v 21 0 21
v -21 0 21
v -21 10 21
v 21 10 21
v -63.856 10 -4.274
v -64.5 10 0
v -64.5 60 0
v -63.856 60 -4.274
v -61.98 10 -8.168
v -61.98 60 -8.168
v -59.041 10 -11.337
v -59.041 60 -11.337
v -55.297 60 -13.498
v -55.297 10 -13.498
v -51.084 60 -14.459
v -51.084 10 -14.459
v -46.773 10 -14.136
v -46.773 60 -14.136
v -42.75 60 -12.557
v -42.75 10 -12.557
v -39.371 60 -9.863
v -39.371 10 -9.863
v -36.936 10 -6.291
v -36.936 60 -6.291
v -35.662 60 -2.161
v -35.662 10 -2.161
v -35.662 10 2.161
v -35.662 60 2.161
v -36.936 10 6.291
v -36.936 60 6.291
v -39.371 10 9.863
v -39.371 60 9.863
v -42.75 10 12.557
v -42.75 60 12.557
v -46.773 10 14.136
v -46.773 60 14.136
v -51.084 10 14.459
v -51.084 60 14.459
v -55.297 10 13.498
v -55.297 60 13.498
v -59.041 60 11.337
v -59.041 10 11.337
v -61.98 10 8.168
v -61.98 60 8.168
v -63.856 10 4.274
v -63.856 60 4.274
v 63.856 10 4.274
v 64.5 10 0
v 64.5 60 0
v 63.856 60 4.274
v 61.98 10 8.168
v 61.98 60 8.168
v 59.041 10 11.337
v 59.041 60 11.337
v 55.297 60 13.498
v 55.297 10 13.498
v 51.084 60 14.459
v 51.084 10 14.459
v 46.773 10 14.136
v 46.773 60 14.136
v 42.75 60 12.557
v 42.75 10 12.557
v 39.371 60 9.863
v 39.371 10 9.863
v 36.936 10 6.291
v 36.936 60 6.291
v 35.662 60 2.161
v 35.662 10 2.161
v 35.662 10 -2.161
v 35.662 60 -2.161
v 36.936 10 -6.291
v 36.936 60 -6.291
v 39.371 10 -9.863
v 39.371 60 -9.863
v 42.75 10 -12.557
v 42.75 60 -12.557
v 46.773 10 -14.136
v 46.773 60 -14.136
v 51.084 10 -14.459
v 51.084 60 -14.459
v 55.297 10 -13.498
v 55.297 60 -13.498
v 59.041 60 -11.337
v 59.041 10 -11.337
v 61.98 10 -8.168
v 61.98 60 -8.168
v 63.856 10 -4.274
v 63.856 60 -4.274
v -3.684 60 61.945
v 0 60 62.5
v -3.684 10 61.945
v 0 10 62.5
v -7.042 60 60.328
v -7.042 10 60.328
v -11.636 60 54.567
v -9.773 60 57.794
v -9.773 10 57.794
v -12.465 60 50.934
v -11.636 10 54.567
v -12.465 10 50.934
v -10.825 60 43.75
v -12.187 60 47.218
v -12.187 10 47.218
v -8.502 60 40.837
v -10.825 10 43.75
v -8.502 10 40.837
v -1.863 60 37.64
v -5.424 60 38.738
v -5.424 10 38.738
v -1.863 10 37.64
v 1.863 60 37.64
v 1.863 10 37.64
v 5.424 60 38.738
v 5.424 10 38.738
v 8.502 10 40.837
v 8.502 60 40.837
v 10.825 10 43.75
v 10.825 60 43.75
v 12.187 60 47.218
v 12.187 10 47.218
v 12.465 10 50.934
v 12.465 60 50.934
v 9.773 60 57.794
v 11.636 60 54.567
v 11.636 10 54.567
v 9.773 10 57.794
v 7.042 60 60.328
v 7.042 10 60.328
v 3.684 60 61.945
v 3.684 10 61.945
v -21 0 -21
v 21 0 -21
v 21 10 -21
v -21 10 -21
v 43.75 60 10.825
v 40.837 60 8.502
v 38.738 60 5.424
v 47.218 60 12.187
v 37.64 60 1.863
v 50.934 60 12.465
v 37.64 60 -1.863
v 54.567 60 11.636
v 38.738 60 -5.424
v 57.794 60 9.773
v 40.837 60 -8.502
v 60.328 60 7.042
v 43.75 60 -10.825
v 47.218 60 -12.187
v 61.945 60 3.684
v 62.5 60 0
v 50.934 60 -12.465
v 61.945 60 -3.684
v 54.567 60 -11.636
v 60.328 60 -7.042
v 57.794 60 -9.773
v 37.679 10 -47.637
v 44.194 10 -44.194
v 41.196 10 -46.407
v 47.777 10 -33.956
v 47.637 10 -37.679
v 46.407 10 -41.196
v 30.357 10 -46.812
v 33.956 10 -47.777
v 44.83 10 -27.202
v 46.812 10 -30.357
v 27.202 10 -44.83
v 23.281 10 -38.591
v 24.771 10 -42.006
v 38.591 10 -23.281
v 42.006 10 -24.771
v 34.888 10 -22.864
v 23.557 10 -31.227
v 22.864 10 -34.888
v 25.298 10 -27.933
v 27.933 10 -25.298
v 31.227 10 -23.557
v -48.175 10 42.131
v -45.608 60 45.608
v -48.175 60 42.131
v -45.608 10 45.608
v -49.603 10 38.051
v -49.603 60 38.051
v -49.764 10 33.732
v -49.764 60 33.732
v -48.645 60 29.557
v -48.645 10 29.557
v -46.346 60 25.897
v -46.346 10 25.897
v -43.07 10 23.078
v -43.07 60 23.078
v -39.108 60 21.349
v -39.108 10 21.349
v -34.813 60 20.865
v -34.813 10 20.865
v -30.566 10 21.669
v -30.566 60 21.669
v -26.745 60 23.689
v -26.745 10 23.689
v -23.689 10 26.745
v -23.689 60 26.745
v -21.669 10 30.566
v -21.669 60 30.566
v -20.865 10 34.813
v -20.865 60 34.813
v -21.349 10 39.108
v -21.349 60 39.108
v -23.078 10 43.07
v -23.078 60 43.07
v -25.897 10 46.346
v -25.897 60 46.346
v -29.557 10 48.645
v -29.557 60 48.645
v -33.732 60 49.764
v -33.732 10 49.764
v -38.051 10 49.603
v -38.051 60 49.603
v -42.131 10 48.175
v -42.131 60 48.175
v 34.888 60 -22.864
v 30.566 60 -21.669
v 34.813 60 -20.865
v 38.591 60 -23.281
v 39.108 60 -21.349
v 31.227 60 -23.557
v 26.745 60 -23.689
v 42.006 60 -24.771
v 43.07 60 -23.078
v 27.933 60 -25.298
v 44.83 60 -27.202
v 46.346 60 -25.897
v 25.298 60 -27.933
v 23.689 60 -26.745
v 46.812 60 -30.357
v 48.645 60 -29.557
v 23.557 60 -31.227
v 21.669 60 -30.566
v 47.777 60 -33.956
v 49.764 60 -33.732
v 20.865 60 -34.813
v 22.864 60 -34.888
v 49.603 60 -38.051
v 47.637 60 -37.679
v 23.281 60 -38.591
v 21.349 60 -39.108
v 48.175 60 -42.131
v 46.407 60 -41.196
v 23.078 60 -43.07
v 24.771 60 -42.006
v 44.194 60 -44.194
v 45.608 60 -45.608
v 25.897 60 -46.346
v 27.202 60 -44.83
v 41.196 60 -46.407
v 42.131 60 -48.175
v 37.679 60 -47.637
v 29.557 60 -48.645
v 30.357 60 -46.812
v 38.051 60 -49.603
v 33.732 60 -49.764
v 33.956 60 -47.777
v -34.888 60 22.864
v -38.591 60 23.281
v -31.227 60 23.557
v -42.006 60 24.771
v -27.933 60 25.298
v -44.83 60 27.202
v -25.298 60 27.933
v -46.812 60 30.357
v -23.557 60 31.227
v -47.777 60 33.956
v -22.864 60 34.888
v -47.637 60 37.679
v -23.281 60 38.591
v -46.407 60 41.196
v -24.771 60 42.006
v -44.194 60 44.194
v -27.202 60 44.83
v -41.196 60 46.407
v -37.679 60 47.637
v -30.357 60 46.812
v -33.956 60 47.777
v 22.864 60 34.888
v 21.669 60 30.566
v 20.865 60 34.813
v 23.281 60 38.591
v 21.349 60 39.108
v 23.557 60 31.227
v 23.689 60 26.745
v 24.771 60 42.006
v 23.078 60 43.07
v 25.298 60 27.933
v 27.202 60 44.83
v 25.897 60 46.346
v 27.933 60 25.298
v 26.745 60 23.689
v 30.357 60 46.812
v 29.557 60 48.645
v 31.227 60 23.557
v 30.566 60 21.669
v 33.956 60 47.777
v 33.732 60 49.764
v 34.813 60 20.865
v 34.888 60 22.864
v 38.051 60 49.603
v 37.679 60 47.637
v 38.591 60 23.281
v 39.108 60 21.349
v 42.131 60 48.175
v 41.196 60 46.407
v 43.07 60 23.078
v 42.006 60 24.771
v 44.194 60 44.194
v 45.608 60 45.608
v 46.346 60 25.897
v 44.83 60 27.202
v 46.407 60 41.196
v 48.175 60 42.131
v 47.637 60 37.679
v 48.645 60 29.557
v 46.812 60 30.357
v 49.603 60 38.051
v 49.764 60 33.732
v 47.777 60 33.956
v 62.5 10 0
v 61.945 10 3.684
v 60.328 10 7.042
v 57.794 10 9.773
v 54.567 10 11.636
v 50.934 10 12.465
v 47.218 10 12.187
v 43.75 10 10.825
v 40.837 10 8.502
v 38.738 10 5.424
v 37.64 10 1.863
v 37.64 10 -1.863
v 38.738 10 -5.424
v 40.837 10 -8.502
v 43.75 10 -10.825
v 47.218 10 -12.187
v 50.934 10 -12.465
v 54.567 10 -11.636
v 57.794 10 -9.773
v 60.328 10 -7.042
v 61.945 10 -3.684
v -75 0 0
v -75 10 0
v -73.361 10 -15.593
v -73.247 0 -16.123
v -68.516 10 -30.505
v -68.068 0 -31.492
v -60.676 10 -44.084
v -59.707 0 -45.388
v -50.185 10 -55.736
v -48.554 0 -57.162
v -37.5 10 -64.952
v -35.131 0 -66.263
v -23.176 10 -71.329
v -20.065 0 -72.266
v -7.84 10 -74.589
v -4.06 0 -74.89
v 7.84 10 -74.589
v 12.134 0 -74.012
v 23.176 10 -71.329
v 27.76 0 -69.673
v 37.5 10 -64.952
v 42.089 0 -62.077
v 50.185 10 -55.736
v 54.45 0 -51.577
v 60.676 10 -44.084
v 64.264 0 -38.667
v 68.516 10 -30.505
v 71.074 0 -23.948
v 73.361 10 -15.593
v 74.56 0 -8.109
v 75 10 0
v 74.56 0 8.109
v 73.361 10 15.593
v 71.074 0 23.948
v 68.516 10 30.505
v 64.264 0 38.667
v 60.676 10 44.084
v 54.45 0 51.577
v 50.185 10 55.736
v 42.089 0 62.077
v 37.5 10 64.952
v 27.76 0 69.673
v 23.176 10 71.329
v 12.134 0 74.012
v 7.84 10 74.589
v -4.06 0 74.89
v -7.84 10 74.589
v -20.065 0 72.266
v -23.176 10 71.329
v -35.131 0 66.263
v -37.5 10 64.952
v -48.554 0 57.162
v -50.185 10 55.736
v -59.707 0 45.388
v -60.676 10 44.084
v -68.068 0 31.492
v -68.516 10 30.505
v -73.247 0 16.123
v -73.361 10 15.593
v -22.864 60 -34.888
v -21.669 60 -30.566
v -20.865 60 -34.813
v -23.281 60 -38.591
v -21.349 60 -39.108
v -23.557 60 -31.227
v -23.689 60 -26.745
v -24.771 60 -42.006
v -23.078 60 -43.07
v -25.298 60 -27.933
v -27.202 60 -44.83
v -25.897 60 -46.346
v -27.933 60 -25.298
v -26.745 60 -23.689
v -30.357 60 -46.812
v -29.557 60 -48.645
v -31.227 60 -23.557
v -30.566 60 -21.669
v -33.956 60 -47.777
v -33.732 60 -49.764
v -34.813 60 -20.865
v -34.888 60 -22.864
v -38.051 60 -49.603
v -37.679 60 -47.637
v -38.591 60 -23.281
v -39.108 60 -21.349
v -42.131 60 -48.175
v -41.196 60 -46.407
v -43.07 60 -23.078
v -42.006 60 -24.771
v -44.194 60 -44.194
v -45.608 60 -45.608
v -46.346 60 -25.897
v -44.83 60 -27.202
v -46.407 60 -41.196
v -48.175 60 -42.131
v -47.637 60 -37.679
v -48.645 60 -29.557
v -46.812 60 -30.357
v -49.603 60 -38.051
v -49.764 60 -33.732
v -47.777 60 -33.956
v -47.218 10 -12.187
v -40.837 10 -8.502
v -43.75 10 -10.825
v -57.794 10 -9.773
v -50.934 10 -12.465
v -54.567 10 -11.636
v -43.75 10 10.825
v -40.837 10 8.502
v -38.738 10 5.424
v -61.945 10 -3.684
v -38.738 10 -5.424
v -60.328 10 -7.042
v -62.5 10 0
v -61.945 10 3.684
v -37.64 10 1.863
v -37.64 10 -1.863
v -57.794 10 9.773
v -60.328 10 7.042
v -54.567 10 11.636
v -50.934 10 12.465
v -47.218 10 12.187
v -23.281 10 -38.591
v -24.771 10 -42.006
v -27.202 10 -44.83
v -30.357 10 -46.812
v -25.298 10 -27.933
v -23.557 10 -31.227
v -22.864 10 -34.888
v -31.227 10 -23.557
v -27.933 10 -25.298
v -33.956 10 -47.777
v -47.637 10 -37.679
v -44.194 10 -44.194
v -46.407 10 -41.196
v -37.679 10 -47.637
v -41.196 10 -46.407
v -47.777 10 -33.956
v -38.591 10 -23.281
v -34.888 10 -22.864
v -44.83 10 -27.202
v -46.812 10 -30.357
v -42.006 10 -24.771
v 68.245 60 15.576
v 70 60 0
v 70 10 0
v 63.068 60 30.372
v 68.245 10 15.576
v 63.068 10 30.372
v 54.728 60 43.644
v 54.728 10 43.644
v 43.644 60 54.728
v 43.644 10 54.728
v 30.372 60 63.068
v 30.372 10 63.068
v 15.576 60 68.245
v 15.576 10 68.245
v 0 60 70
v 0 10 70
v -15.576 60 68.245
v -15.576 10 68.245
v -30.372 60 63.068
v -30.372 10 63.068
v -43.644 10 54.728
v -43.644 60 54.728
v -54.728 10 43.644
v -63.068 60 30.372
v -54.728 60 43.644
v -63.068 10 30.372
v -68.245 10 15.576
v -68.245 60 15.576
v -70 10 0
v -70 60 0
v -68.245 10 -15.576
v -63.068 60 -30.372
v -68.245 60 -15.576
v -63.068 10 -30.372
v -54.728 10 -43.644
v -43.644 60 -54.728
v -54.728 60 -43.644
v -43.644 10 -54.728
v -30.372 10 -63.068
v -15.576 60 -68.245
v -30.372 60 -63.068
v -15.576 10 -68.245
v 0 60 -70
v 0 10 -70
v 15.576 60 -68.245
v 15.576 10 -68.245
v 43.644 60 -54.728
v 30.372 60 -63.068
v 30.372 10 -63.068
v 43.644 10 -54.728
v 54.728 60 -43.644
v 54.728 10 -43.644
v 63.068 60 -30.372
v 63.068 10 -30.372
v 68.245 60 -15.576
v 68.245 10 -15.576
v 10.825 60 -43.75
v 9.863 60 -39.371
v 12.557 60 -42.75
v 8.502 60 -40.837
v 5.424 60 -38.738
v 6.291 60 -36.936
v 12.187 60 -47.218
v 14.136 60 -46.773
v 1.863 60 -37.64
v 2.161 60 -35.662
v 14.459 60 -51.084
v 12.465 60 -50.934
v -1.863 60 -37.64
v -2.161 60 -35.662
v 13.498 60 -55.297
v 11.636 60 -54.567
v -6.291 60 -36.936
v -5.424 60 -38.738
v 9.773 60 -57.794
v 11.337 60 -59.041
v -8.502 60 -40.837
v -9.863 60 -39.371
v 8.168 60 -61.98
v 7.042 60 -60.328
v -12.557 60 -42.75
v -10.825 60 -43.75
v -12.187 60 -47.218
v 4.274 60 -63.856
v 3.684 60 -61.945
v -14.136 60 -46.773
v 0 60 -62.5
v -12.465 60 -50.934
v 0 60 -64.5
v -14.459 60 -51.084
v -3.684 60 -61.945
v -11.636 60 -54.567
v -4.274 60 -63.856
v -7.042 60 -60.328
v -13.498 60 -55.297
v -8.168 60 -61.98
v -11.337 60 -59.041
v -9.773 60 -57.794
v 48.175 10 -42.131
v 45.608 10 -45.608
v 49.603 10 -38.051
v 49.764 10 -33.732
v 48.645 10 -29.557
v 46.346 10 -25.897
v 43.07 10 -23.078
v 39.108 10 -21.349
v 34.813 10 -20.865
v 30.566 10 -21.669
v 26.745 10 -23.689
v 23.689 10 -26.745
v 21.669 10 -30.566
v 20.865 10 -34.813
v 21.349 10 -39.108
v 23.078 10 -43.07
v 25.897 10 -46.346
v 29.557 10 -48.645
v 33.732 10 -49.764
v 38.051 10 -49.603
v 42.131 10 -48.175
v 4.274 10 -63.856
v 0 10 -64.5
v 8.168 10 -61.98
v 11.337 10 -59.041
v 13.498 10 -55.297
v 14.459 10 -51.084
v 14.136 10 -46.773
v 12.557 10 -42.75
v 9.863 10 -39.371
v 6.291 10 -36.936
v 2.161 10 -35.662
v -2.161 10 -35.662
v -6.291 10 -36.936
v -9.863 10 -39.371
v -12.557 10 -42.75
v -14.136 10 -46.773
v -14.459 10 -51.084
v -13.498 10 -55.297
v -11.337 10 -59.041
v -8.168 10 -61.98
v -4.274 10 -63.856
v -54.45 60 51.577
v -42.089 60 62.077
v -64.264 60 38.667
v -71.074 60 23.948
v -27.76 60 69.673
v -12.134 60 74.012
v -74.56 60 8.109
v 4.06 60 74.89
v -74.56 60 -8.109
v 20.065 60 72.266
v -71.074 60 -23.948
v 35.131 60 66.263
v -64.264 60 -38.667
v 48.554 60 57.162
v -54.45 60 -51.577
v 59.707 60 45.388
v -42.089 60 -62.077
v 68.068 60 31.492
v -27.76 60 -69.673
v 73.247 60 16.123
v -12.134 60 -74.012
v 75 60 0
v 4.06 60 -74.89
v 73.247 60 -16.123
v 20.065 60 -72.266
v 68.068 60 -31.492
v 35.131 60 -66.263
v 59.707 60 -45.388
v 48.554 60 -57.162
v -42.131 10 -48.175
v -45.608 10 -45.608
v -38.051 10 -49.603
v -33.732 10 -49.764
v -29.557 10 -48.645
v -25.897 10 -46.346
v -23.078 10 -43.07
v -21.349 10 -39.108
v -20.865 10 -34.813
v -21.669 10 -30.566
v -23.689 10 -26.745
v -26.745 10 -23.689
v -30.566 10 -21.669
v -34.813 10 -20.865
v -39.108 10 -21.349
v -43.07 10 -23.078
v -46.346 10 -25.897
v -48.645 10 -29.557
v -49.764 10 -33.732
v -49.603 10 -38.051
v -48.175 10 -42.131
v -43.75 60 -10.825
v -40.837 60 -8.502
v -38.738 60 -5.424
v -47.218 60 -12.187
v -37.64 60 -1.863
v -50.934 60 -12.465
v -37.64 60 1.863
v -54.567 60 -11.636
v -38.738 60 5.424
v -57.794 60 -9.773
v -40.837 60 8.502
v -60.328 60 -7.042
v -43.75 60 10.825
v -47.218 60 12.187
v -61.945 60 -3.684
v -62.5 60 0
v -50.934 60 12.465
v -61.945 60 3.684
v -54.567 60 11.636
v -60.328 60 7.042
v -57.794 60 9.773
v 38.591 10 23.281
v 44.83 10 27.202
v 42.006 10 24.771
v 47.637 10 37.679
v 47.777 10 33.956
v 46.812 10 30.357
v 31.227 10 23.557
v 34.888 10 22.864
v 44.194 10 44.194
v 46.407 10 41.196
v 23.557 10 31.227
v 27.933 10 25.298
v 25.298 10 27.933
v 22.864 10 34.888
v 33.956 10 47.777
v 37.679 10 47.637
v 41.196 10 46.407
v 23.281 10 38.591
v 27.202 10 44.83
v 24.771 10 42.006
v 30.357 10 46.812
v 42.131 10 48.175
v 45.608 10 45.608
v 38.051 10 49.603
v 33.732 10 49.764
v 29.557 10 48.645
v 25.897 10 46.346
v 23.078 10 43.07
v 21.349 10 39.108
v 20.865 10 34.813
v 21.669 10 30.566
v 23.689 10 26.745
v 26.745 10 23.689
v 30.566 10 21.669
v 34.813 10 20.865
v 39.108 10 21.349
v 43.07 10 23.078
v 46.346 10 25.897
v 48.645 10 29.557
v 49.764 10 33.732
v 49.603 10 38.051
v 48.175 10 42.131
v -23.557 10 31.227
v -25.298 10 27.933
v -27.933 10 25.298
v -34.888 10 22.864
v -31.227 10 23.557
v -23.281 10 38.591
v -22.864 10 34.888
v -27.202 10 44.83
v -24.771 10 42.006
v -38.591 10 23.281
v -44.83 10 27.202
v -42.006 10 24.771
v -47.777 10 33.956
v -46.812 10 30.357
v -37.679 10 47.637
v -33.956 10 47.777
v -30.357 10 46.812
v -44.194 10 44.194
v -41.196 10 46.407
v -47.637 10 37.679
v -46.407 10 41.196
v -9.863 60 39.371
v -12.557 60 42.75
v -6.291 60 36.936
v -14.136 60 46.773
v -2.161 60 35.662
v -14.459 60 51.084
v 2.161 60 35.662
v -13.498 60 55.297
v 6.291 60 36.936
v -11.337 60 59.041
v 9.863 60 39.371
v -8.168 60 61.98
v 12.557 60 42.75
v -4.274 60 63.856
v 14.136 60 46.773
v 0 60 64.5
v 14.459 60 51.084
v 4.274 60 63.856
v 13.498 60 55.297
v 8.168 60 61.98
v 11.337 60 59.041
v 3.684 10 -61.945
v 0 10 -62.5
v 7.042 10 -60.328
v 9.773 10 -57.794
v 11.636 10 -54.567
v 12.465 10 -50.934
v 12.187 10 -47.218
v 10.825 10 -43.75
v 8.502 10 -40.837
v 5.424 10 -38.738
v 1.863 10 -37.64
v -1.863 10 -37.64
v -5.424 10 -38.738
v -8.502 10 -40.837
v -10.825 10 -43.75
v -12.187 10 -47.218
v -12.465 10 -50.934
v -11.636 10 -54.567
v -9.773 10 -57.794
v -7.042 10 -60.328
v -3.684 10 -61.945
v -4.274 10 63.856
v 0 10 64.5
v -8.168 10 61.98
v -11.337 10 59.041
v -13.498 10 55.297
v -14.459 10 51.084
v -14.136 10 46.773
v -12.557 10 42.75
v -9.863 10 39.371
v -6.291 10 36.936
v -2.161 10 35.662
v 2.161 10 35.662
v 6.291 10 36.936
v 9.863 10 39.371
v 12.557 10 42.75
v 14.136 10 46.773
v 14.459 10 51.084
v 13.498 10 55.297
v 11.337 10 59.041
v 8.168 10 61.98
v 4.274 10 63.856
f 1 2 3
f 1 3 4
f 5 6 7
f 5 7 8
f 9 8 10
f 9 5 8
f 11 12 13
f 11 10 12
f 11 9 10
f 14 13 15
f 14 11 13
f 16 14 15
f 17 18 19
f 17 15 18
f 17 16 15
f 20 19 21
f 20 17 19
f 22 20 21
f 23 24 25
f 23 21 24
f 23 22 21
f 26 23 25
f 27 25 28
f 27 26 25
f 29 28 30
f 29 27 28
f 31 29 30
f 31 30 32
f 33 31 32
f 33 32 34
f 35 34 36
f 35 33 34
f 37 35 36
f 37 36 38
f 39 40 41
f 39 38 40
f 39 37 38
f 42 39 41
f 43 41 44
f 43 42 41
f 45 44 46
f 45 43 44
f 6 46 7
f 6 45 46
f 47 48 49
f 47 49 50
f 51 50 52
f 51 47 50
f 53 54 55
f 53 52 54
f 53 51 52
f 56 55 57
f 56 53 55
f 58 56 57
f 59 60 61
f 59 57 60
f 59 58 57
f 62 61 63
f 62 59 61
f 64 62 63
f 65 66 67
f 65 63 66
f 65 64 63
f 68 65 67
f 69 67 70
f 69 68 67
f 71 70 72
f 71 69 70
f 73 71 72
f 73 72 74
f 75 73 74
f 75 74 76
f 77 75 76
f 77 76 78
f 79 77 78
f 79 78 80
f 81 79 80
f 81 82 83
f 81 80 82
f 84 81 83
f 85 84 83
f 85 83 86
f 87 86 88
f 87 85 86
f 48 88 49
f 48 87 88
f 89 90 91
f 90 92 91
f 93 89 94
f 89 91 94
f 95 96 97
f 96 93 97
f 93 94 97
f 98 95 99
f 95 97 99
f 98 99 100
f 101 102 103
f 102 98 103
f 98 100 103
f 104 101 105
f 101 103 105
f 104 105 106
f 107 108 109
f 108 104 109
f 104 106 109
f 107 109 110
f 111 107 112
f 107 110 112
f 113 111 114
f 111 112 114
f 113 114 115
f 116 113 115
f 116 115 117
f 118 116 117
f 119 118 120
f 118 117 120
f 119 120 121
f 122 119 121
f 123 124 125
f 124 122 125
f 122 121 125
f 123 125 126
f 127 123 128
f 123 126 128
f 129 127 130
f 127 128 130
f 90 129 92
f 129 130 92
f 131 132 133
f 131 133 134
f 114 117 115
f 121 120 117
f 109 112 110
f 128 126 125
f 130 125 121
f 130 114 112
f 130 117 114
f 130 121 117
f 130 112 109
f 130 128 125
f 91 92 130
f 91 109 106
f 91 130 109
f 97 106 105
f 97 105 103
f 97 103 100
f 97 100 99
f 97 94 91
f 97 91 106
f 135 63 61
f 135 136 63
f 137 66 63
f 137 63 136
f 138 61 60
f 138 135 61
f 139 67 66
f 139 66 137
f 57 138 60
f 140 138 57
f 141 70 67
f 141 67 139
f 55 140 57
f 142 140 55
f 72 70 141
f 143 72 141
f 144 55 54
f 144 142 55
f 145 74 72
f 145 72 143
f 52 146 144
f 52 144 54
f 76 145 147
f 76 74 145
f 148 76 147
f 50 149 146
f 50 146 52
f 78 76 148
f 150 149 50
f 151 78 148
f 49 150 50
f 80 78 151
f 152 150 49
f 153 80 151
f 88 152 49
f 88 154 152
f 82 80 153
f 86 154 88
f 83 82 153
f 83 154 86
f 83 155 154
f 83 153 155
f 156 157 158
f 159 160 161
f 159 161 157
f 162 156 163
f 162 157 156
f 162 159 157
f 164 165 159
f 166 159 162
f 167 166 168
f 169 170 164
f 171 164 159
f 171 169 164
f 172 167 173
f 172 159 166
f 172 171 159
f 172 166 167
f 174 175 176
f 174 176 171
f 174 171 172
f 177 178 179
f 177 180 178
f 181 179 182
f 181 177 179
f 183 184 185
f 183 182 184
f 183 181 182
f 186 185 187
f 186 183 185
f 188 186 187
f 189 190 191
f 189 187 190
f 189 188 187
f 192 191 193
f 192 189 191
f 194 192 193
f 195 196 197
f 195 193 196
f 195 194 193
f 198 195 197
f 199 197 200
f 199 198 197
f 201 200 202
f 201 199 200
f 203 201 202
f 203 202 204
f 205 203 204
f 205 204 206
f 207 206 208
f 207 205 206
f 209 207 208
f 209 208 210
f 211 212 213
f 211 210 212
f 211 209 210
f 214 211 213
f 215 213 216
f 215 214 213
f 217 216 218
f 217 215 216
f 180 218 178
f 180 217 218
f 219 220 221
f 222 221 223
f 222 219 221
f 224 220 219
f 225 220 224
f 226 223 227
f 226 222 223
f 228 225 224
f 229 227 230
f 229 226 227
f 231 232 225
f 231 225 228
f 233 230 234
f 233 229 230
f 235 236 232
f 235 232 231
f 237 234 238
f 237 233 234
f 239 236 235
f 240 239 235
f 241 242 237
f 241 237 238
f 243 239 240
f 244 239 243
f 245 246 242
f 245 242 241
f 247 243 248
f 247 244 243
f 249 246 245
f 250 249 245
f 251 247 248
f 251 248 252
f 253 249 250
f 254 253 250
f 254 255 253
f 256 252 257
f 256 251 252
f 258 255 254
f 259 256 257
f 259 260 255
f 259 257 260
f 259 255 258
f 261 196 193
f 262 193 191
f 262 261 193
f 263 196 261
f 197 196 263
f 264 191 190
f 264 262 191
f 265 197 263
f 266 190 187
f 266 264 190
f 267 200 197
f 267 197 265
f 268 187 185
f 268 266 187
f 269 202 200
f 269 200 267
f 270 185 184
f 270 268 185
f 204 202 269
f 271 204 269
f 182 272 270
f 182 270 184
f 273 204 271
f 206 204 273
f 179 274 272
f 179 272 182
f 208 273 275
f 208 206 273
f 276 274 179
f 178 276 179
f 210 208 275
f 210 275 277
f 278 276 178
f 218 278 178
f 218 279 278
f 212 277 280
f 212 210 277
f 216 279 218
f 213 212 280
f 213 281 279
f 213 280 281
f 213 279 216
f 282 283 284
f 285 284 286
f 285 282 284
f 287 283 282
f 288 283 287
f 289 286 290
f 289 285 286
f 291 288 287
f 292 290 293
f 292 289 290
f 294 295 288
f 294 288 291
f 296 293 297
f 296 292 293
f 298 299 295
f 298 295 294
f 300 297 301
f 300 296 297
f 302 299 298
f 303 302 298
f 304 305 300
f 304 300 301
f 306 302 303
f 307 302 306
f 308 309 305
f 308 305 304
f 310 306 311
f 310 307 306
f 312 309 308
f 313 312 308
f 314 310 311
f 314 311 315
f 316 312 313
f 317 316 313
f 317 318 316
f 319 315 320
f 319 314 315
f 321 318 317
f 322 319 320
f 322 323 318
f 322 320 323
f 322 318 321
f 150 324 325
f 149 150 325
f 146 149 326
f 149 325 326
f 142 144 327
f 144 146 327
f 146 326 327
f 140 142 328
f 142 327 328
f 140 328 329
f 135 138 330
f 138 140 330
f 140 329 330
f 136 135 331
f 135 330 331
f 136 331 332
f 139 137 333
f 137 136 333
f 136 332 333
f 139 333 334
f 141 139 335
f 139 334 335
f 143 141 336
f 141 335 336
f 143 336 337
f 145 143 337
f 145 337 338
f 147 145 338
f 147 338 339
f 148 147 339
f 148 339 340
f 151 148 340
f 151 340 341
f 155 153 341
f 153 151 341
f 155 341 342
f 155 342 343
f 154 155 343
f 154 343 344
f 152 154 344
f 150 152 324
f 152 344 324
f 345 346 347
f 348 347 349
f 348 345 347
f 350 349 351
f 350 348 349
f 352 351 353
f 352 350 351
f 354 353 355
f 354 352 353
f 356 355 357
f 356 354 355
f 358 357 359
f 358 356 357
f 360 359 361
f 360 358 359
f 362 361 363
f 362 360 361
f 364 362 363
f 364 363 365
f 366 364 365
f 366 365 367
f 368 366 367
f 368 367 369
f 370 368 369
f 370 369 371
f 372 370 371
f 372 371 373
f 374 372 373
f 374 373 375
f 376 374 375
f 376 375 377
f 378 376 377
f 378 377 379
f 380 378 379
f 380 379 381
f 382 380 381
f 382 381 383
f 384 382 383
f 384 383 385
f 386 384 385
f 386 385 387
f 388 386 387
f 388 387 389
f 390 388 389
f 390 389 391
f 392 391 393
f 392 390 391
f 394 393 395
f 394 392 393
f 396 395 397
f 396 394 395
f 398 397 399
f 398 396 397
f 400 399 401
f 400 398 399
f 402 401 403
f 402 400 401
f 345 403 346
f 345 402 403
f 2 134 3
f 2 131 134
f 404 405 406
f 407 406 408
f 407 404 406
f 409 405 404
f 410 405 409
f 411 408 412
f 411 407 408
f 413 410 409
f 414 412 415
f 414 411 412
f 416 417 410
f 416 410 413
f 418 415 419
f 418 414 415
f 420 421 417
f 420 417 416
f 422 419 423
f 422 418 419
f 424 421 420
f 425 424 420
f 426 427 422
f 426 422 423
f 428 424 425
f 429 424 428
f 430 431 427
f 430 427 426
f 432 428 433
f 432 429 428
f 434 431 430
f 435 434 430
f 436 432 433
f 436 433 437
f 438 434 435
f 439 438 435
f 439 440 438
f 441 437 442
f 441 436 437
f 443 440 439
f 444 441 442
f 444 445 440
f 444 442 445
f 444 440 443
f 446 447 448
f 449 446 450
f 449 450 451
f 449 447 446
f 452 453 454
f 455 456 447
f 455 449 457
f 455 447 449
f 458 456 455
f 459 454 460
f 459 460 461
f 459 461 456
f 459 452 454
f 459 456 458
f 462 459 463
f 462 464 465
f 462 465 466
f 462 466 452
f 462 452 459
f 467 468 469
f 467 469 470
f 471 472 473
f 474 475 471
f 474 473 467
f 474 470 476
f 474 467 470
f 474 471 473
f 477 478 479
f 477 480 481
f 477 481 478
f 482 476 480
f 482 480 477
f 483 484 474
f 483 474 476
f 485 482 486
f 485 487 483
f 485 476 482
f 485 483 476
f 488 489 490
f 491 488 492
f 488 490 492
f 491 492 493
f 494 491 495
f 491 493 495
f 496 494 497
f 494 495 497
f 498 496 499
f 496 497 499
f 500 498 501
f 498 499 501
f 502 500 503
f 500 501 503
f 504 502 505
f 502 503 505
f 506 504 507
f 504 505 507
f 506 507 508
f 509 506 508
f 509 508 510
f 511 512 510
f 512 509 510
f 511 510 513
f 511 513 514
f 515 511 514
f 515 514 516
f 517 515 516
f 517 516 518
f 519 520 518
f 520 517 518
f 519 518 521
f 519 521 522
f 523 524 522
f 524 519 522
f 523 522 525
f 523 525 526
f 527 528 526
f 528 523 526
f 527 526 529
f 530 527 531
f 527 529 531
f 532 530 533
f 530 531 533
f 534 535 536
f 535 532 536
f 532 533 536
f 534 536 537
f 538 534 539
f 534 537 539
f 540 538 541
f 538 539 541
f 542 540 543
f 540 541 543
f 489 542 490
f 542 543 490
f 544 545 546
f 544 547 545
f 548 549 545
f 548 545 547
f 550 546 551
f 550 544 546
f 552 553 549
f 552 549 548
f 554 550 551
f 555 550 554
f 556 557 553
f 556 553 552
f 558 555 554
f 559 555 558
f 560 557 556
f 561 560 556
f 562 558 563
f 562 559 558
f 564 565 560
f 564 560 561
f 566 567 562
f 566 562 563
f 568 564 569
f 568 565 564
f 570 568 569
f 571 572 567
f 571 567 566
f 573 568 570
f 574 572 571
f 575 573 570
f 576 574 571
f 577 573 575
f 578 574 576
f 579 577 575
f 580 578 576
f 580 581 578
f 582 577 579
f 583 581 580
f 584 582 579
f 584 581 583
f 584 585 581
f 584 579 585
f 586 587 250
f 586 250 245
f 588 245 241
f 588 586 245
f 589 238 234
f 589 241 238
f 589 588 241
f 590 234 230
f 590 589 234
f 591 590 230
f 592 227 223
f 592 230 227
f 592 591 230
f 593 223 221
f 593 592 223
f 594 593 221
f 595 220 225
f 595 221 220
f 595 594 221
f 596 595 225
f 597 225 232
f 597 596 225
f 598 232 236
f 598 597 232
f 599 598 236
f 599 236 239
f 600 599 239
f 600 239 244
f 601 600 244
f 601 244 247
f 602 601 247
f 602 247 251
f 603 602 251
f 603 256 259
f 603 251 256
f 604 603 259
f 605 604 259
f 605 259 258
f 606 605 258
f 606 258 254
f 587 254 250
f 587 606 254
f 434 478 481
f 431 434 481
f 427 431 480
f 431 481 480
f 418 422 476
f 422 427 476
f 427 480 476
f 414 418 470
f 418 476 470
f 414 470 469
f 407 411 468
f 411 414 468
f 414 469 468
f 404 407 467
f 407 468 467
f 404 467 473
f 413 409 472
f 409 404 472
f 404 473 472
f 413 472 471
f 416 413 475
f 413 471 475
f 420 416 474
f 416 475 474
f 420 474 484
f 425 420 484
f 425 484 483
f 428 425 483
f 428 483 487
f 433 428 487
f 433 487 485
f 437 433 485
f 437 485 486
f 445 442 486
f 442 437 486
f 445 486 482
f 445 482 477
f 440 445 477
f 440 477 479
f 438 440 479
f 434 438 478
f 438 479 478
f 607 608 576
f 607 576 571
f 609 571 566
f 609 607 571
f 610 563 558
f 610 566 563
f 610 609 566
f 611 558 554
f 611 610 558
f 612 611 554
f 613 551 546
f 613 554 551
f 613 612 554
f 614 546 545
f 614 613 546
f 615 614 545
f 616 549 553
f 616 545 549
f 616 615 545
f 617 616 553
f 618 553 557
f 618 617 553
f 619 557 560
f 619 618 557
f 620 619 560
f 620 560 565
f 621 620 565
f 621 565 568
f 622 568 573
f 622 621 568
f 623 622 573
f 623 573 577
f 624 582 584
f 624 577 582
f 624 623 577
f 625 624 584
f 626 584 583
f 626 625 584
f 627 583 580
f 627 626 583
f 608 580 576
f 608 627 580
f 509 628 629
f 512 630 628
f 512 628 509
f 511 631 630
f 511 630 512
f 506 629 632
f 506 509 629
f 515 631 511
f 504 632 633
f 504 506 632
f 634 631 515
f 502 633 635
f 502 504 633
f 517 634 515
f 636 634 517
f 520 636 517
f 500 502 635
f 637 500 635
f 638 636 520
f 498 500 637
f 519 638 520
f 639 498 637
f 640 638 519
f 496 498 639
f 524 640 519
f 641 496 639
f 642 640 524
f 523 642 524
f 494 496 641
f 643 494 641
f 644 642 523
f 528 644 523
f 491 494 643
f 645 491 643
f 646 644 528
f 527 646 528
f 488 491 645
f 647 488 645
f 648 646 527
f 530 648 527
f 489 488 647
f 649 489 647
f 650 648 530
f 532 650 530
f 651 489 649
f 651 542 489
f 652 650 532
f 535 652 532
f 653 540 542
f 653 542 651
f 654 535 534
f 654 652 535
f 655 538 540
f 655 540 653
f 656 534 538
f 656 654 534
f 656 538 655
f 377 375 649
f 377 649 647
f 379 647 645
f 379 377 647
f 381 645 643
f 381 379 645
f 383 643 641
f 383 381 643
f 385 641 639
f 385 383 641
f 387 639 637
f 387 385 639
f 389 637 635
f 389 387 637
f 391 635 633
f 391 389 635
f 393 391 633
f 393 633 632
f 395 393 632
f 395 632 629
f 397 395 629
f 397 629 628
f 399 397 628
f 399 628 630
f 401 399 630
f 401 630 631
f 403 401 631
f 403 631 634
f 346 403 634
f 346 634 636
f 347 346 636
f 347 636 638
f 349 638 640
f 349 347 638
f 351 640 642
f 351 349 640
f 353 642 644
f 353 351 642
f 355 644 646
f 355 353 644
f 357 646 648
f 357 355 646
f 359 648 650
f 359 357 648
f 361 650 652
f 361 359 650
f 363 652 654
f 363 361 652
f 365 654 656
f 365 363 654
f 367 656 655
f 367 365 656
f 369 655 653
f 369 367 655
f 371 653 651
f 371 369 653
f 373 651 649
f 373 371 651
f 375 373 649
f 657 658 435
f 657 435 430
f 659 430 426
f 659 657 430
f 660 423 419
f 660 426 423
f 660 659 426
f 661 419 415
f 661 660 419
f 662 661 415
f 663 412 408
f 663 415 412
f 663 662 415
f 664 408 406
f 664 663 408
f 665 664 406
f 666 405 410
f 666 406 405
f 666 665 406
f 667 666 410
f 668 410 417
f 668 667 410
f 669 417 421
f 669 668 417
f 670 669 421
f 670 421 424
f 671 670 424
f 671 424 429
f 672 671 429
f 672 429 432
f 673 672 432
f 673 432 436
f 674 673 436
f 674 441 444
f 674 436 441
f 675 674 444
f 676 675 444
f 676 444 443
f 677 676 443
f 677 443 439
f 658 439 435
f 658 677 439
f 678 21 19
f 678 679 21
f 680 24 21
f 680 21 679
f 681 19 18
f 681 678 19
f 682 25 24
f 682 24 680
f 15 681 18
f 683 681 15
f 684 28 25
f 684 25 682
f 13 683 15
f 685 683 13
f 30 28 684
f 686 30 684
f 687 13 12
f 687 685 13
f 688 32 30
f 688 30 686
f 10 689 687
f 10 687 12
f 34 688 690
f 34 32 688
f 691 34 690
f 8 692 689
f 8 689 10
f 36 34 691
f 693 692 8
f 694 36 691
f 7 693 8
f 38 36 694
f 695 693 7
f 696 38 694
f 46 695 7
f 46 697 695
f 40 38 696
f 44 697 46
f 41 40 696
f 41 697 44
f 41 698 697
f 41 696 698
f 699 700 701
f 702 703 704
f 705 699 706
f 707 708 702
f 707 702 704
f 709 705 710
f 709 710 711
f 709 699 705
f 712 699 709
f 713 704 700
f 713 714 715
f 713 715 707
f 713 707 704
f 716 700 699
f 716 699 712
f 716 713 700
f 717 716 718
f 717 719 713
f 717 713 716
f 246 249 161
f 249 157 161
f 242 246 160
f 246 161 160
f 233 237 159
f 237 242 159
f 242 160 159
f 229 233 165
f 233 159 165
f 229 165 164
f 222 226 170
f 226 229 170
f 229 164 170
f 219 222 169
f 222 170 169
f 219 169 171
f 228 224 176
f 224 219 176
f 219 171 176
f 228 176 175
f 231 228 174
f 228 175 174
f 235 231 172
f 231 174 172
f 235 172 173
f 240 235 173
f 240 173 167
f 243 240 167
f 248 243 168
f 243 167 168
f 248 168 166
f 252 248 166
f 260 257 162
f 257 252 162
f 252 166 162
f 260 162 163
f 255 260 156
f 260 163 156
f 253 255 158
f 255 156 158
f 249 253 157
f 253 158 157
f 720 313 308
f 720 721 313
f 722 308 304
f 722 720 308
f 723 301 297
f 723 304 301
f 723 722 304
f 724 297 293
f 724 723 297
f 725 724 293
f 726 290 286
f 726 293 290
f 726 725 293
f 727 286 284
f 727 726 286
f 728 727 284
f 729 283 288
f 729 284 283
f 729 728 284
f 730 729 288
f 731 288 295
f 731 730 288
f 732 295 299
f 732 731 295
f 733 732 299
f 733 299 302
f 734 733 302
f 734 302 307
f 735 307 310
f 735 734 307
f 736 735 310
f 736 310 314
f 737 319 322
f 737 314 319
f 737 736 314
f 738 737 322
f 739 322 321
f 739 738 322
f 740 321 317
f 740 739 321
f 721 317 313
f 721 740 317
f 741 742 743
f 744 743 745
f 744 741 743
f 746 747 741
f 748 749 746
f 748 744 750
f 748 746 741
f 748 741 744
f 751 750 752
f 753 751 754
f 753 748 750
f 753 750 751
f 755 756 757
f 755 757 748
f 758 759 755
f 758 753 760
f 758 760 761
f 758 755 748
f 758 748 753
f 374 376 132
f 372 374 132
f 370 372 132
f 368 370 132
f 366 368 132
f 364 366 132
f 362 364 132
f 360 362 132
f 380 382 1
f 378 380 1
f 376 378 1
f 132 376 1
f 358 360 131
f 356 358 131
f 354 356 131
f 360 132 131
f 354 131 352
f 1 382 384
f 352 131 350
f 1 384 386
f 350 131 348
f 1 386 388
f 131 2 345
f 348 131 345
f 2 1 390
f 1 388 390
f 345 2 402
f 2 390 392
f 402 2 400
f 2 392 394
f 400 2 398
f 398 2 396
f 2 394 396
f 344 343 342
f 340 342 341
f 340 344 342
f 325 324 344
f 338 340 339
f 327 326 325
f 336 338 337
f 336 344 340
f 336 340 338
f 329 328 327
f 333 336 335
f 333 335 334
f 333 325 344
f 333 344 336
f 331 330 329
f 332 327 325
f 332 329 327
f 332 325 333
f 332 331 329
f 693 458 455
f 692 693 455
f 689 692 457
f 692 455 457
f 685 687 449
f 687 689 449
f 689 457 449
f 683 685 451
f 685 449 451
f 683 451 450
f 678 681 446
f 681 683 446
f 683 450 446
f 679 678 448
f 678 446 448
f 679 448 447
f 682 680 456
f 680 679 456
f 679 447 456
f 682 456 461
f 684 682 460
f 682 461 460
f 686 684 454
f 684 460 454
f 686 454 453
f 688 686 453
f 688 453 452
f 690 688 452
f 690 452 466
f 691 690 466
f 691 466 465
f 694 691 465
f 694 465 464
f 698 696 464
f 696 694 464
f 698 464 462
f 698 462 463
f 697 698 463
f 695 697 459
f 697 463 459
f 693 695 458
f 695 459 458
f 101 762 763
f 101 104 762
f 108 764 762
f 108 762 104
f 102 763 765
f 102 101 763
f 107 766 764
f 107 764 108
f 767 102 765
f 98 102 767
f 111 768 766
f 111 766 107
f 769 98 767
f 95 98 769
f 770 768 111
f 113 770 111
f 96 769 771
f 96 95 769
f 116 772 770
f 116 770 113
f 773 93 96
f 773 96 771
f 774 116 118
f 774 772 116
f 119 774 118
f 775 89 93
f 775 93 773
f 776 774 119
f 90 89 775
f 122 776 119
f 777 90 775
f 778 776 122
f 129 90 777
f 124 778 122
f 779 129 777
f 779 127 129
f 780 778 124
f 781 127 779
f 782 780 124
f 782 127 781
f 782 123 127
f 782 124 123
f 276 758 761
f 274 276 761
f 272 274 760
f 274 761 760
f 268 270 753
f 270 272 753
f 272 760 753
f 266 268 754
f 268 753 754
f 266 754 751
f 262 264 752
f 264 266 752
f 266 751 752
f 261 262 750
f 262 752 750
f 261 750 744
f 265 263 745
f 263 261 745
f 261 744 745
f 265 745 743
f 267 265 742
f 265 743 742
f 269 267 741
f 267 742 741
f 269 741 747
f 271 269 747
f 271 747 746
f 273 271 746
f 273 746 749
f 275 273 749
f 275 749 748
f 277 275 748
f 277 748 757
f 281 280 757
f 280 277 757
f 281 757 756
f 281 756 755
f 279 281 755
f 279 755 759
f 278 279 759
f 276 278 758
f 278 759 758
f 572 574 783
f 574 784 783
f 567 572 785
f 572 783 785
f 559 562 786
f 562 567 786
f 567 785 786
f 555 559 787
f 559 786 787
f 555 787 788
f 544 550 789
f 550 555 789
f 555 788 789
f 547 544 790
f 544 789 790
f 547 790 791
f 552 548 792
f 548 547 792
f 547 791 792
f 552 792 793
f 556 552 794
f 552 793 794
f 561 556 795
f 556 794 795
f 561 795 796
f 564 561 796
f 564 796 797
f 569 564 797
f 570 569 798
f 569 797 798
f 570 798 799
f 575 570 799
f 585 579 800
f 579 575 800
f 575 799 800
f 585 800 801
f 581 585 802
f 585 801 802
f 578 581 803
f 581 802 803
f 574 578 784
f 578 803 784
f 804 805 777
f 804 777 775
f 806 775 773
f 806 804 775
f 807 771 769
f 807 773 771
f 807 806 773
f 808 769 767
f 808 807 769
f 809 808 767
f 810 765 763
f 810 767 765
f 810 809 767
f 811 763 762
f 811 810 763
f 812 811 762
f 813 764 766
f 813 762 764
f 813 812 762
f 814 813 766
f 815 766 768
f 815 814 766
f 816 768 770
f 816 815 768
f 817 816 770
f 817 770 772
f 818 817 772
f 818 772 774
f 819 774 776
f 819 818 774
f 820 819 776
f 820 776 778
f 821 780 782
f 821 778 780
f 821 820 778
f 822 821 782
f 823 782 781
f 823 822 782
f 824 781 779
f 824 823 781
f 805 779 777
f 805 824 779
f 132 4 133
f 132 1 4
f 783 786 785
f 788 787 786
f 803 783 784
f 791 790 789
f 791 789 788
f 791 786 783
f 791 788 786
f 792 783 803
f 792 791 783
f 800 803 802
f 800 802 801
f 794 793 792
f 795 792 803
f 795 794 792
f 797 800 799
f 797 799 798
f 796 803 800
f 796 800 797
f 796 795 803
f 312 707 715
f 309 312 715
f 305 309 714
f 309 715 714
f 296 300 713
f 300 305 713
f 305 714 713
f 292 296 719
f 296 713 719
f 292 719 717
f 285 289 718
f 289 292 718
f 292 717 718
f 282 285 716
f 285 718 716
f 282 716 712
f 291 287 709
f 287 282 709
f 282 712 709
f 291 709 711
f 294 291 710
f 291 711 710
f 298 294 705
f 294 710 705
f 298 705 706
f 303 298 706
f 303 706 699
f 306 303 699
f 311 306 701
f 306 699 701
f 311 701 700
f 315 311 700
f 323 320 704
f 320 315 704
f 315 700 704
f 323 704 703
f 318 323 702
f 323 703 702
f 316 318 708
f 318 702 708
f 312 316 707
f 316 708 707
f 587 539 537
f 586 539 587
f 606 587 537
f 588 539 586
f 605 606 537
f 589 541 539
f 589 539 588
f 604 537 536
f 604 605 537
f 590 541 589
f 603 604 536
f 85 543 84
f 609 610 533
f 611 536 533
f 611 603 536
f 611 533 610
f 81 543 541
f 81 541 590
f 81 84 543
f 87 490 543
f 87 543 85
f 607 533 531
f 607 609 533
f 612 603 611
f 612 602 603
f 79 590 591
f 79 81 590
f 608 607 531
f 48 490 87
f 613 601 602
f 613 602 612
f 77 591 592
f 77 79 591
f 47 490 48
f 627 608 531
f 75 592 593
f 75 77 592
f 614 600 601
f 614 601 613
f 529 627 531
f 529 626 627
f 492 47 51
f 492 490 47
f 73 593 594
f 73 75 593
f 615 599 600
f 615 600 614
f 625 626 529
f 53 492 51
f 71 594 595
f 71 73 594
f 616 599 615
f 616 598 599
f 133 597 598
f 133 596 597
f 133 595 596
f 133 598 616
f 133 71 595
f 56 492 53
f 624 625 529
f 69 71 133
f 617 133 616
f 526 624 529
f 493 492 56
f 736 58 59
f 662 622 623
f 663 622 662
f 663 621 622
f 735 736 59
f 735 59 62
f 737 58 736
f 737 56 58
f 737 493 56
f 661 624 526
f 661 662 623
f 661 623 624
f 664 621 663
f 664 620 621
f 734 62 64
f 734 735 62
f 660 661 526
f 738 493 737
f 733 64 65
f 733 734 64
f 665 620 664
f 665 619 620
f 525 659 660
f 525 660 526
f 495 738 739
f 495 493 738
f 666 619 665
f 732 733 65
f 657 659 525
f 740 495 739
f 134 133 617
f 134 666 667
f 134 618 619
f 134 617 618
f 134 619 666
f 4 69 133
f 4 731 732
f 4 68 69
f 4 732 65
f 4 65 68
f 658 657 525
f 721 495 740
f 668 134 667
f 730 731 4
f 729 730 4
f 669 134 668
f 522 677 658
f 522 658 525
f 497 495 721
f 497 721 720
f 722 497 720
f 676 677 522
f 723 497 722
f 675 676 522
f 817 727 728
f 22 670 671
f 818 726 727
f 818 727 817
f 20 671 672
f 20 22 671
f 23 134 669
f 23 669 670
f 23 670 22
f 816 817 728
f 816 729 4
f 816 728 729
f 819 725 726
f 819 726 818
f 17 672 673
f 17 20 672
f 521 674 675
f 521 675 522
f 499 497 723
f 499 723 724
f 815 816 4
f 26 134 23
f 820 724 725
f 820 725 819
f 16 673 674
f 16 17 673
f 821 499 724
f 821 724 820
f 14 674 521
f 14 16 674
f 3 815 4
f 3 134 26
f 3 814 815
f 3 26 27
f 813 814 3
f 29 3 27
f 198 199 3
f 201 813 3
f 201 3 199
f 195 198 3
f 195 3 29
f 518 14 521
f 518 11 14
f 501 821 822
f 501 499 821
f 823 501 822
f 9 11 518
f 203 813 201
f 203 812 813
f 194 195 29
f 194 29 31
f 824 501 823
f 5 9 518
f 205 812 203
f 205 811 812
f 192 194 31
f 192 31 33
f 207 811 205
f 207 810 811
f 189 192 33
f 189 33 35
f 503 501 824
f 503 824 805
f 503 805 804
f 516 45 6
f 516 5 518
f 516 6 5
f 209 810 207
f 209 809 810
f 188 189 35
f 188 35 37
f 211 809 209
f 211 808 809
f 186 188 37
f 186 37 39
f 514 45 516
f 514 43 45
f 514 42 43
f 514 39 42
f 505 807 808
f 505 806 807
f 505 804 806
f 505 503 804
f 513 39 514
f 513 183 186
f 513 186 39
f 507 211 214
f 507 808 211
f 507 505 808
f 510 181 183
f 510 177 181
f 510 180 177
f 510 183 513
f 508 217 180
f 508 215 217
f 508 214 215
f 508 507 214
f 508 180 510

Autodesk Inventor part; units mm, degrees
ref_plane "YZ Plane" through (0, 0, 0) normal (1, 0, 0) x (0, 1, 0)
ref_plane "XZ Plane" through (0, 0, 0) normal (0, 1, 0) x (-1, 0, 0)
ref_plane "XY Plane" through (0, 0, 0) normal (0, 0, 1) x (1, 0, 0)
sketch "Sketch1" plane through (0, 0, 0) normal (0, 1, 0) x (-1, 0, 0)
  line L0 (-21, -21) -> (21, -21)
  line L1 (21, -21) -> (21, 21)
  line L2 (21, 21) -> (-21, 21)
  line L3 (-21, 21) -> (-21, -21)
  line L4 (-21, -21) -> (21, 21) construction
  line L5 (21, -21) -> (-21, 21) construction
  circle A0 centre (0, 0) radius 75
  circle A1 centre (50, 0) radius 12.5
  circle A2 centre (50, 0) radius 14.5
  line L6 (50, 0) -> (0, 0) construction
  dimension "d0" = 42
  dimension "d1" = 42
  dimension "d2" = 150
  dimension "d3" = 50
  dimension "d4" = 2
  dimension "d5" = 25
extrude "Extrusion1" add sketch "Sketch1" along normal blind 10 contours A0 | A1 | A2
extrude "Extrusion2" add sketch "Sketch1" along normal blind 50 from surface at 10 contours A2
sketch "Sketch2" plane through (0, 10, 0) normal (0, 1, 0) x (1, 0, 0)
  circle A0 centre (-50, 0) radius 14.5 projected
  line L0 (21, 21) -> (21, -21) projected
  line L1 (21, -21) -> (-21, -21) projected
  line L2 (-21, -21) -> (-21, 21) projected
  line L3 (-21, 21) -> (21, 21) projected
  circle A1 centre (0, 0) radius 75 projected
  circle A2 centre (0, 0) radius 70
  dimension "d10" = 5
extrude "Extrusion3" add sketch "Sketch2" along normal blind 50 contours A1
pattern_circular "Circular Pattern1" count 8 over 360 about axis through (0, 0, 0) along (0, 1, 0) of "Extrusion2"
properties part number "bottom"
